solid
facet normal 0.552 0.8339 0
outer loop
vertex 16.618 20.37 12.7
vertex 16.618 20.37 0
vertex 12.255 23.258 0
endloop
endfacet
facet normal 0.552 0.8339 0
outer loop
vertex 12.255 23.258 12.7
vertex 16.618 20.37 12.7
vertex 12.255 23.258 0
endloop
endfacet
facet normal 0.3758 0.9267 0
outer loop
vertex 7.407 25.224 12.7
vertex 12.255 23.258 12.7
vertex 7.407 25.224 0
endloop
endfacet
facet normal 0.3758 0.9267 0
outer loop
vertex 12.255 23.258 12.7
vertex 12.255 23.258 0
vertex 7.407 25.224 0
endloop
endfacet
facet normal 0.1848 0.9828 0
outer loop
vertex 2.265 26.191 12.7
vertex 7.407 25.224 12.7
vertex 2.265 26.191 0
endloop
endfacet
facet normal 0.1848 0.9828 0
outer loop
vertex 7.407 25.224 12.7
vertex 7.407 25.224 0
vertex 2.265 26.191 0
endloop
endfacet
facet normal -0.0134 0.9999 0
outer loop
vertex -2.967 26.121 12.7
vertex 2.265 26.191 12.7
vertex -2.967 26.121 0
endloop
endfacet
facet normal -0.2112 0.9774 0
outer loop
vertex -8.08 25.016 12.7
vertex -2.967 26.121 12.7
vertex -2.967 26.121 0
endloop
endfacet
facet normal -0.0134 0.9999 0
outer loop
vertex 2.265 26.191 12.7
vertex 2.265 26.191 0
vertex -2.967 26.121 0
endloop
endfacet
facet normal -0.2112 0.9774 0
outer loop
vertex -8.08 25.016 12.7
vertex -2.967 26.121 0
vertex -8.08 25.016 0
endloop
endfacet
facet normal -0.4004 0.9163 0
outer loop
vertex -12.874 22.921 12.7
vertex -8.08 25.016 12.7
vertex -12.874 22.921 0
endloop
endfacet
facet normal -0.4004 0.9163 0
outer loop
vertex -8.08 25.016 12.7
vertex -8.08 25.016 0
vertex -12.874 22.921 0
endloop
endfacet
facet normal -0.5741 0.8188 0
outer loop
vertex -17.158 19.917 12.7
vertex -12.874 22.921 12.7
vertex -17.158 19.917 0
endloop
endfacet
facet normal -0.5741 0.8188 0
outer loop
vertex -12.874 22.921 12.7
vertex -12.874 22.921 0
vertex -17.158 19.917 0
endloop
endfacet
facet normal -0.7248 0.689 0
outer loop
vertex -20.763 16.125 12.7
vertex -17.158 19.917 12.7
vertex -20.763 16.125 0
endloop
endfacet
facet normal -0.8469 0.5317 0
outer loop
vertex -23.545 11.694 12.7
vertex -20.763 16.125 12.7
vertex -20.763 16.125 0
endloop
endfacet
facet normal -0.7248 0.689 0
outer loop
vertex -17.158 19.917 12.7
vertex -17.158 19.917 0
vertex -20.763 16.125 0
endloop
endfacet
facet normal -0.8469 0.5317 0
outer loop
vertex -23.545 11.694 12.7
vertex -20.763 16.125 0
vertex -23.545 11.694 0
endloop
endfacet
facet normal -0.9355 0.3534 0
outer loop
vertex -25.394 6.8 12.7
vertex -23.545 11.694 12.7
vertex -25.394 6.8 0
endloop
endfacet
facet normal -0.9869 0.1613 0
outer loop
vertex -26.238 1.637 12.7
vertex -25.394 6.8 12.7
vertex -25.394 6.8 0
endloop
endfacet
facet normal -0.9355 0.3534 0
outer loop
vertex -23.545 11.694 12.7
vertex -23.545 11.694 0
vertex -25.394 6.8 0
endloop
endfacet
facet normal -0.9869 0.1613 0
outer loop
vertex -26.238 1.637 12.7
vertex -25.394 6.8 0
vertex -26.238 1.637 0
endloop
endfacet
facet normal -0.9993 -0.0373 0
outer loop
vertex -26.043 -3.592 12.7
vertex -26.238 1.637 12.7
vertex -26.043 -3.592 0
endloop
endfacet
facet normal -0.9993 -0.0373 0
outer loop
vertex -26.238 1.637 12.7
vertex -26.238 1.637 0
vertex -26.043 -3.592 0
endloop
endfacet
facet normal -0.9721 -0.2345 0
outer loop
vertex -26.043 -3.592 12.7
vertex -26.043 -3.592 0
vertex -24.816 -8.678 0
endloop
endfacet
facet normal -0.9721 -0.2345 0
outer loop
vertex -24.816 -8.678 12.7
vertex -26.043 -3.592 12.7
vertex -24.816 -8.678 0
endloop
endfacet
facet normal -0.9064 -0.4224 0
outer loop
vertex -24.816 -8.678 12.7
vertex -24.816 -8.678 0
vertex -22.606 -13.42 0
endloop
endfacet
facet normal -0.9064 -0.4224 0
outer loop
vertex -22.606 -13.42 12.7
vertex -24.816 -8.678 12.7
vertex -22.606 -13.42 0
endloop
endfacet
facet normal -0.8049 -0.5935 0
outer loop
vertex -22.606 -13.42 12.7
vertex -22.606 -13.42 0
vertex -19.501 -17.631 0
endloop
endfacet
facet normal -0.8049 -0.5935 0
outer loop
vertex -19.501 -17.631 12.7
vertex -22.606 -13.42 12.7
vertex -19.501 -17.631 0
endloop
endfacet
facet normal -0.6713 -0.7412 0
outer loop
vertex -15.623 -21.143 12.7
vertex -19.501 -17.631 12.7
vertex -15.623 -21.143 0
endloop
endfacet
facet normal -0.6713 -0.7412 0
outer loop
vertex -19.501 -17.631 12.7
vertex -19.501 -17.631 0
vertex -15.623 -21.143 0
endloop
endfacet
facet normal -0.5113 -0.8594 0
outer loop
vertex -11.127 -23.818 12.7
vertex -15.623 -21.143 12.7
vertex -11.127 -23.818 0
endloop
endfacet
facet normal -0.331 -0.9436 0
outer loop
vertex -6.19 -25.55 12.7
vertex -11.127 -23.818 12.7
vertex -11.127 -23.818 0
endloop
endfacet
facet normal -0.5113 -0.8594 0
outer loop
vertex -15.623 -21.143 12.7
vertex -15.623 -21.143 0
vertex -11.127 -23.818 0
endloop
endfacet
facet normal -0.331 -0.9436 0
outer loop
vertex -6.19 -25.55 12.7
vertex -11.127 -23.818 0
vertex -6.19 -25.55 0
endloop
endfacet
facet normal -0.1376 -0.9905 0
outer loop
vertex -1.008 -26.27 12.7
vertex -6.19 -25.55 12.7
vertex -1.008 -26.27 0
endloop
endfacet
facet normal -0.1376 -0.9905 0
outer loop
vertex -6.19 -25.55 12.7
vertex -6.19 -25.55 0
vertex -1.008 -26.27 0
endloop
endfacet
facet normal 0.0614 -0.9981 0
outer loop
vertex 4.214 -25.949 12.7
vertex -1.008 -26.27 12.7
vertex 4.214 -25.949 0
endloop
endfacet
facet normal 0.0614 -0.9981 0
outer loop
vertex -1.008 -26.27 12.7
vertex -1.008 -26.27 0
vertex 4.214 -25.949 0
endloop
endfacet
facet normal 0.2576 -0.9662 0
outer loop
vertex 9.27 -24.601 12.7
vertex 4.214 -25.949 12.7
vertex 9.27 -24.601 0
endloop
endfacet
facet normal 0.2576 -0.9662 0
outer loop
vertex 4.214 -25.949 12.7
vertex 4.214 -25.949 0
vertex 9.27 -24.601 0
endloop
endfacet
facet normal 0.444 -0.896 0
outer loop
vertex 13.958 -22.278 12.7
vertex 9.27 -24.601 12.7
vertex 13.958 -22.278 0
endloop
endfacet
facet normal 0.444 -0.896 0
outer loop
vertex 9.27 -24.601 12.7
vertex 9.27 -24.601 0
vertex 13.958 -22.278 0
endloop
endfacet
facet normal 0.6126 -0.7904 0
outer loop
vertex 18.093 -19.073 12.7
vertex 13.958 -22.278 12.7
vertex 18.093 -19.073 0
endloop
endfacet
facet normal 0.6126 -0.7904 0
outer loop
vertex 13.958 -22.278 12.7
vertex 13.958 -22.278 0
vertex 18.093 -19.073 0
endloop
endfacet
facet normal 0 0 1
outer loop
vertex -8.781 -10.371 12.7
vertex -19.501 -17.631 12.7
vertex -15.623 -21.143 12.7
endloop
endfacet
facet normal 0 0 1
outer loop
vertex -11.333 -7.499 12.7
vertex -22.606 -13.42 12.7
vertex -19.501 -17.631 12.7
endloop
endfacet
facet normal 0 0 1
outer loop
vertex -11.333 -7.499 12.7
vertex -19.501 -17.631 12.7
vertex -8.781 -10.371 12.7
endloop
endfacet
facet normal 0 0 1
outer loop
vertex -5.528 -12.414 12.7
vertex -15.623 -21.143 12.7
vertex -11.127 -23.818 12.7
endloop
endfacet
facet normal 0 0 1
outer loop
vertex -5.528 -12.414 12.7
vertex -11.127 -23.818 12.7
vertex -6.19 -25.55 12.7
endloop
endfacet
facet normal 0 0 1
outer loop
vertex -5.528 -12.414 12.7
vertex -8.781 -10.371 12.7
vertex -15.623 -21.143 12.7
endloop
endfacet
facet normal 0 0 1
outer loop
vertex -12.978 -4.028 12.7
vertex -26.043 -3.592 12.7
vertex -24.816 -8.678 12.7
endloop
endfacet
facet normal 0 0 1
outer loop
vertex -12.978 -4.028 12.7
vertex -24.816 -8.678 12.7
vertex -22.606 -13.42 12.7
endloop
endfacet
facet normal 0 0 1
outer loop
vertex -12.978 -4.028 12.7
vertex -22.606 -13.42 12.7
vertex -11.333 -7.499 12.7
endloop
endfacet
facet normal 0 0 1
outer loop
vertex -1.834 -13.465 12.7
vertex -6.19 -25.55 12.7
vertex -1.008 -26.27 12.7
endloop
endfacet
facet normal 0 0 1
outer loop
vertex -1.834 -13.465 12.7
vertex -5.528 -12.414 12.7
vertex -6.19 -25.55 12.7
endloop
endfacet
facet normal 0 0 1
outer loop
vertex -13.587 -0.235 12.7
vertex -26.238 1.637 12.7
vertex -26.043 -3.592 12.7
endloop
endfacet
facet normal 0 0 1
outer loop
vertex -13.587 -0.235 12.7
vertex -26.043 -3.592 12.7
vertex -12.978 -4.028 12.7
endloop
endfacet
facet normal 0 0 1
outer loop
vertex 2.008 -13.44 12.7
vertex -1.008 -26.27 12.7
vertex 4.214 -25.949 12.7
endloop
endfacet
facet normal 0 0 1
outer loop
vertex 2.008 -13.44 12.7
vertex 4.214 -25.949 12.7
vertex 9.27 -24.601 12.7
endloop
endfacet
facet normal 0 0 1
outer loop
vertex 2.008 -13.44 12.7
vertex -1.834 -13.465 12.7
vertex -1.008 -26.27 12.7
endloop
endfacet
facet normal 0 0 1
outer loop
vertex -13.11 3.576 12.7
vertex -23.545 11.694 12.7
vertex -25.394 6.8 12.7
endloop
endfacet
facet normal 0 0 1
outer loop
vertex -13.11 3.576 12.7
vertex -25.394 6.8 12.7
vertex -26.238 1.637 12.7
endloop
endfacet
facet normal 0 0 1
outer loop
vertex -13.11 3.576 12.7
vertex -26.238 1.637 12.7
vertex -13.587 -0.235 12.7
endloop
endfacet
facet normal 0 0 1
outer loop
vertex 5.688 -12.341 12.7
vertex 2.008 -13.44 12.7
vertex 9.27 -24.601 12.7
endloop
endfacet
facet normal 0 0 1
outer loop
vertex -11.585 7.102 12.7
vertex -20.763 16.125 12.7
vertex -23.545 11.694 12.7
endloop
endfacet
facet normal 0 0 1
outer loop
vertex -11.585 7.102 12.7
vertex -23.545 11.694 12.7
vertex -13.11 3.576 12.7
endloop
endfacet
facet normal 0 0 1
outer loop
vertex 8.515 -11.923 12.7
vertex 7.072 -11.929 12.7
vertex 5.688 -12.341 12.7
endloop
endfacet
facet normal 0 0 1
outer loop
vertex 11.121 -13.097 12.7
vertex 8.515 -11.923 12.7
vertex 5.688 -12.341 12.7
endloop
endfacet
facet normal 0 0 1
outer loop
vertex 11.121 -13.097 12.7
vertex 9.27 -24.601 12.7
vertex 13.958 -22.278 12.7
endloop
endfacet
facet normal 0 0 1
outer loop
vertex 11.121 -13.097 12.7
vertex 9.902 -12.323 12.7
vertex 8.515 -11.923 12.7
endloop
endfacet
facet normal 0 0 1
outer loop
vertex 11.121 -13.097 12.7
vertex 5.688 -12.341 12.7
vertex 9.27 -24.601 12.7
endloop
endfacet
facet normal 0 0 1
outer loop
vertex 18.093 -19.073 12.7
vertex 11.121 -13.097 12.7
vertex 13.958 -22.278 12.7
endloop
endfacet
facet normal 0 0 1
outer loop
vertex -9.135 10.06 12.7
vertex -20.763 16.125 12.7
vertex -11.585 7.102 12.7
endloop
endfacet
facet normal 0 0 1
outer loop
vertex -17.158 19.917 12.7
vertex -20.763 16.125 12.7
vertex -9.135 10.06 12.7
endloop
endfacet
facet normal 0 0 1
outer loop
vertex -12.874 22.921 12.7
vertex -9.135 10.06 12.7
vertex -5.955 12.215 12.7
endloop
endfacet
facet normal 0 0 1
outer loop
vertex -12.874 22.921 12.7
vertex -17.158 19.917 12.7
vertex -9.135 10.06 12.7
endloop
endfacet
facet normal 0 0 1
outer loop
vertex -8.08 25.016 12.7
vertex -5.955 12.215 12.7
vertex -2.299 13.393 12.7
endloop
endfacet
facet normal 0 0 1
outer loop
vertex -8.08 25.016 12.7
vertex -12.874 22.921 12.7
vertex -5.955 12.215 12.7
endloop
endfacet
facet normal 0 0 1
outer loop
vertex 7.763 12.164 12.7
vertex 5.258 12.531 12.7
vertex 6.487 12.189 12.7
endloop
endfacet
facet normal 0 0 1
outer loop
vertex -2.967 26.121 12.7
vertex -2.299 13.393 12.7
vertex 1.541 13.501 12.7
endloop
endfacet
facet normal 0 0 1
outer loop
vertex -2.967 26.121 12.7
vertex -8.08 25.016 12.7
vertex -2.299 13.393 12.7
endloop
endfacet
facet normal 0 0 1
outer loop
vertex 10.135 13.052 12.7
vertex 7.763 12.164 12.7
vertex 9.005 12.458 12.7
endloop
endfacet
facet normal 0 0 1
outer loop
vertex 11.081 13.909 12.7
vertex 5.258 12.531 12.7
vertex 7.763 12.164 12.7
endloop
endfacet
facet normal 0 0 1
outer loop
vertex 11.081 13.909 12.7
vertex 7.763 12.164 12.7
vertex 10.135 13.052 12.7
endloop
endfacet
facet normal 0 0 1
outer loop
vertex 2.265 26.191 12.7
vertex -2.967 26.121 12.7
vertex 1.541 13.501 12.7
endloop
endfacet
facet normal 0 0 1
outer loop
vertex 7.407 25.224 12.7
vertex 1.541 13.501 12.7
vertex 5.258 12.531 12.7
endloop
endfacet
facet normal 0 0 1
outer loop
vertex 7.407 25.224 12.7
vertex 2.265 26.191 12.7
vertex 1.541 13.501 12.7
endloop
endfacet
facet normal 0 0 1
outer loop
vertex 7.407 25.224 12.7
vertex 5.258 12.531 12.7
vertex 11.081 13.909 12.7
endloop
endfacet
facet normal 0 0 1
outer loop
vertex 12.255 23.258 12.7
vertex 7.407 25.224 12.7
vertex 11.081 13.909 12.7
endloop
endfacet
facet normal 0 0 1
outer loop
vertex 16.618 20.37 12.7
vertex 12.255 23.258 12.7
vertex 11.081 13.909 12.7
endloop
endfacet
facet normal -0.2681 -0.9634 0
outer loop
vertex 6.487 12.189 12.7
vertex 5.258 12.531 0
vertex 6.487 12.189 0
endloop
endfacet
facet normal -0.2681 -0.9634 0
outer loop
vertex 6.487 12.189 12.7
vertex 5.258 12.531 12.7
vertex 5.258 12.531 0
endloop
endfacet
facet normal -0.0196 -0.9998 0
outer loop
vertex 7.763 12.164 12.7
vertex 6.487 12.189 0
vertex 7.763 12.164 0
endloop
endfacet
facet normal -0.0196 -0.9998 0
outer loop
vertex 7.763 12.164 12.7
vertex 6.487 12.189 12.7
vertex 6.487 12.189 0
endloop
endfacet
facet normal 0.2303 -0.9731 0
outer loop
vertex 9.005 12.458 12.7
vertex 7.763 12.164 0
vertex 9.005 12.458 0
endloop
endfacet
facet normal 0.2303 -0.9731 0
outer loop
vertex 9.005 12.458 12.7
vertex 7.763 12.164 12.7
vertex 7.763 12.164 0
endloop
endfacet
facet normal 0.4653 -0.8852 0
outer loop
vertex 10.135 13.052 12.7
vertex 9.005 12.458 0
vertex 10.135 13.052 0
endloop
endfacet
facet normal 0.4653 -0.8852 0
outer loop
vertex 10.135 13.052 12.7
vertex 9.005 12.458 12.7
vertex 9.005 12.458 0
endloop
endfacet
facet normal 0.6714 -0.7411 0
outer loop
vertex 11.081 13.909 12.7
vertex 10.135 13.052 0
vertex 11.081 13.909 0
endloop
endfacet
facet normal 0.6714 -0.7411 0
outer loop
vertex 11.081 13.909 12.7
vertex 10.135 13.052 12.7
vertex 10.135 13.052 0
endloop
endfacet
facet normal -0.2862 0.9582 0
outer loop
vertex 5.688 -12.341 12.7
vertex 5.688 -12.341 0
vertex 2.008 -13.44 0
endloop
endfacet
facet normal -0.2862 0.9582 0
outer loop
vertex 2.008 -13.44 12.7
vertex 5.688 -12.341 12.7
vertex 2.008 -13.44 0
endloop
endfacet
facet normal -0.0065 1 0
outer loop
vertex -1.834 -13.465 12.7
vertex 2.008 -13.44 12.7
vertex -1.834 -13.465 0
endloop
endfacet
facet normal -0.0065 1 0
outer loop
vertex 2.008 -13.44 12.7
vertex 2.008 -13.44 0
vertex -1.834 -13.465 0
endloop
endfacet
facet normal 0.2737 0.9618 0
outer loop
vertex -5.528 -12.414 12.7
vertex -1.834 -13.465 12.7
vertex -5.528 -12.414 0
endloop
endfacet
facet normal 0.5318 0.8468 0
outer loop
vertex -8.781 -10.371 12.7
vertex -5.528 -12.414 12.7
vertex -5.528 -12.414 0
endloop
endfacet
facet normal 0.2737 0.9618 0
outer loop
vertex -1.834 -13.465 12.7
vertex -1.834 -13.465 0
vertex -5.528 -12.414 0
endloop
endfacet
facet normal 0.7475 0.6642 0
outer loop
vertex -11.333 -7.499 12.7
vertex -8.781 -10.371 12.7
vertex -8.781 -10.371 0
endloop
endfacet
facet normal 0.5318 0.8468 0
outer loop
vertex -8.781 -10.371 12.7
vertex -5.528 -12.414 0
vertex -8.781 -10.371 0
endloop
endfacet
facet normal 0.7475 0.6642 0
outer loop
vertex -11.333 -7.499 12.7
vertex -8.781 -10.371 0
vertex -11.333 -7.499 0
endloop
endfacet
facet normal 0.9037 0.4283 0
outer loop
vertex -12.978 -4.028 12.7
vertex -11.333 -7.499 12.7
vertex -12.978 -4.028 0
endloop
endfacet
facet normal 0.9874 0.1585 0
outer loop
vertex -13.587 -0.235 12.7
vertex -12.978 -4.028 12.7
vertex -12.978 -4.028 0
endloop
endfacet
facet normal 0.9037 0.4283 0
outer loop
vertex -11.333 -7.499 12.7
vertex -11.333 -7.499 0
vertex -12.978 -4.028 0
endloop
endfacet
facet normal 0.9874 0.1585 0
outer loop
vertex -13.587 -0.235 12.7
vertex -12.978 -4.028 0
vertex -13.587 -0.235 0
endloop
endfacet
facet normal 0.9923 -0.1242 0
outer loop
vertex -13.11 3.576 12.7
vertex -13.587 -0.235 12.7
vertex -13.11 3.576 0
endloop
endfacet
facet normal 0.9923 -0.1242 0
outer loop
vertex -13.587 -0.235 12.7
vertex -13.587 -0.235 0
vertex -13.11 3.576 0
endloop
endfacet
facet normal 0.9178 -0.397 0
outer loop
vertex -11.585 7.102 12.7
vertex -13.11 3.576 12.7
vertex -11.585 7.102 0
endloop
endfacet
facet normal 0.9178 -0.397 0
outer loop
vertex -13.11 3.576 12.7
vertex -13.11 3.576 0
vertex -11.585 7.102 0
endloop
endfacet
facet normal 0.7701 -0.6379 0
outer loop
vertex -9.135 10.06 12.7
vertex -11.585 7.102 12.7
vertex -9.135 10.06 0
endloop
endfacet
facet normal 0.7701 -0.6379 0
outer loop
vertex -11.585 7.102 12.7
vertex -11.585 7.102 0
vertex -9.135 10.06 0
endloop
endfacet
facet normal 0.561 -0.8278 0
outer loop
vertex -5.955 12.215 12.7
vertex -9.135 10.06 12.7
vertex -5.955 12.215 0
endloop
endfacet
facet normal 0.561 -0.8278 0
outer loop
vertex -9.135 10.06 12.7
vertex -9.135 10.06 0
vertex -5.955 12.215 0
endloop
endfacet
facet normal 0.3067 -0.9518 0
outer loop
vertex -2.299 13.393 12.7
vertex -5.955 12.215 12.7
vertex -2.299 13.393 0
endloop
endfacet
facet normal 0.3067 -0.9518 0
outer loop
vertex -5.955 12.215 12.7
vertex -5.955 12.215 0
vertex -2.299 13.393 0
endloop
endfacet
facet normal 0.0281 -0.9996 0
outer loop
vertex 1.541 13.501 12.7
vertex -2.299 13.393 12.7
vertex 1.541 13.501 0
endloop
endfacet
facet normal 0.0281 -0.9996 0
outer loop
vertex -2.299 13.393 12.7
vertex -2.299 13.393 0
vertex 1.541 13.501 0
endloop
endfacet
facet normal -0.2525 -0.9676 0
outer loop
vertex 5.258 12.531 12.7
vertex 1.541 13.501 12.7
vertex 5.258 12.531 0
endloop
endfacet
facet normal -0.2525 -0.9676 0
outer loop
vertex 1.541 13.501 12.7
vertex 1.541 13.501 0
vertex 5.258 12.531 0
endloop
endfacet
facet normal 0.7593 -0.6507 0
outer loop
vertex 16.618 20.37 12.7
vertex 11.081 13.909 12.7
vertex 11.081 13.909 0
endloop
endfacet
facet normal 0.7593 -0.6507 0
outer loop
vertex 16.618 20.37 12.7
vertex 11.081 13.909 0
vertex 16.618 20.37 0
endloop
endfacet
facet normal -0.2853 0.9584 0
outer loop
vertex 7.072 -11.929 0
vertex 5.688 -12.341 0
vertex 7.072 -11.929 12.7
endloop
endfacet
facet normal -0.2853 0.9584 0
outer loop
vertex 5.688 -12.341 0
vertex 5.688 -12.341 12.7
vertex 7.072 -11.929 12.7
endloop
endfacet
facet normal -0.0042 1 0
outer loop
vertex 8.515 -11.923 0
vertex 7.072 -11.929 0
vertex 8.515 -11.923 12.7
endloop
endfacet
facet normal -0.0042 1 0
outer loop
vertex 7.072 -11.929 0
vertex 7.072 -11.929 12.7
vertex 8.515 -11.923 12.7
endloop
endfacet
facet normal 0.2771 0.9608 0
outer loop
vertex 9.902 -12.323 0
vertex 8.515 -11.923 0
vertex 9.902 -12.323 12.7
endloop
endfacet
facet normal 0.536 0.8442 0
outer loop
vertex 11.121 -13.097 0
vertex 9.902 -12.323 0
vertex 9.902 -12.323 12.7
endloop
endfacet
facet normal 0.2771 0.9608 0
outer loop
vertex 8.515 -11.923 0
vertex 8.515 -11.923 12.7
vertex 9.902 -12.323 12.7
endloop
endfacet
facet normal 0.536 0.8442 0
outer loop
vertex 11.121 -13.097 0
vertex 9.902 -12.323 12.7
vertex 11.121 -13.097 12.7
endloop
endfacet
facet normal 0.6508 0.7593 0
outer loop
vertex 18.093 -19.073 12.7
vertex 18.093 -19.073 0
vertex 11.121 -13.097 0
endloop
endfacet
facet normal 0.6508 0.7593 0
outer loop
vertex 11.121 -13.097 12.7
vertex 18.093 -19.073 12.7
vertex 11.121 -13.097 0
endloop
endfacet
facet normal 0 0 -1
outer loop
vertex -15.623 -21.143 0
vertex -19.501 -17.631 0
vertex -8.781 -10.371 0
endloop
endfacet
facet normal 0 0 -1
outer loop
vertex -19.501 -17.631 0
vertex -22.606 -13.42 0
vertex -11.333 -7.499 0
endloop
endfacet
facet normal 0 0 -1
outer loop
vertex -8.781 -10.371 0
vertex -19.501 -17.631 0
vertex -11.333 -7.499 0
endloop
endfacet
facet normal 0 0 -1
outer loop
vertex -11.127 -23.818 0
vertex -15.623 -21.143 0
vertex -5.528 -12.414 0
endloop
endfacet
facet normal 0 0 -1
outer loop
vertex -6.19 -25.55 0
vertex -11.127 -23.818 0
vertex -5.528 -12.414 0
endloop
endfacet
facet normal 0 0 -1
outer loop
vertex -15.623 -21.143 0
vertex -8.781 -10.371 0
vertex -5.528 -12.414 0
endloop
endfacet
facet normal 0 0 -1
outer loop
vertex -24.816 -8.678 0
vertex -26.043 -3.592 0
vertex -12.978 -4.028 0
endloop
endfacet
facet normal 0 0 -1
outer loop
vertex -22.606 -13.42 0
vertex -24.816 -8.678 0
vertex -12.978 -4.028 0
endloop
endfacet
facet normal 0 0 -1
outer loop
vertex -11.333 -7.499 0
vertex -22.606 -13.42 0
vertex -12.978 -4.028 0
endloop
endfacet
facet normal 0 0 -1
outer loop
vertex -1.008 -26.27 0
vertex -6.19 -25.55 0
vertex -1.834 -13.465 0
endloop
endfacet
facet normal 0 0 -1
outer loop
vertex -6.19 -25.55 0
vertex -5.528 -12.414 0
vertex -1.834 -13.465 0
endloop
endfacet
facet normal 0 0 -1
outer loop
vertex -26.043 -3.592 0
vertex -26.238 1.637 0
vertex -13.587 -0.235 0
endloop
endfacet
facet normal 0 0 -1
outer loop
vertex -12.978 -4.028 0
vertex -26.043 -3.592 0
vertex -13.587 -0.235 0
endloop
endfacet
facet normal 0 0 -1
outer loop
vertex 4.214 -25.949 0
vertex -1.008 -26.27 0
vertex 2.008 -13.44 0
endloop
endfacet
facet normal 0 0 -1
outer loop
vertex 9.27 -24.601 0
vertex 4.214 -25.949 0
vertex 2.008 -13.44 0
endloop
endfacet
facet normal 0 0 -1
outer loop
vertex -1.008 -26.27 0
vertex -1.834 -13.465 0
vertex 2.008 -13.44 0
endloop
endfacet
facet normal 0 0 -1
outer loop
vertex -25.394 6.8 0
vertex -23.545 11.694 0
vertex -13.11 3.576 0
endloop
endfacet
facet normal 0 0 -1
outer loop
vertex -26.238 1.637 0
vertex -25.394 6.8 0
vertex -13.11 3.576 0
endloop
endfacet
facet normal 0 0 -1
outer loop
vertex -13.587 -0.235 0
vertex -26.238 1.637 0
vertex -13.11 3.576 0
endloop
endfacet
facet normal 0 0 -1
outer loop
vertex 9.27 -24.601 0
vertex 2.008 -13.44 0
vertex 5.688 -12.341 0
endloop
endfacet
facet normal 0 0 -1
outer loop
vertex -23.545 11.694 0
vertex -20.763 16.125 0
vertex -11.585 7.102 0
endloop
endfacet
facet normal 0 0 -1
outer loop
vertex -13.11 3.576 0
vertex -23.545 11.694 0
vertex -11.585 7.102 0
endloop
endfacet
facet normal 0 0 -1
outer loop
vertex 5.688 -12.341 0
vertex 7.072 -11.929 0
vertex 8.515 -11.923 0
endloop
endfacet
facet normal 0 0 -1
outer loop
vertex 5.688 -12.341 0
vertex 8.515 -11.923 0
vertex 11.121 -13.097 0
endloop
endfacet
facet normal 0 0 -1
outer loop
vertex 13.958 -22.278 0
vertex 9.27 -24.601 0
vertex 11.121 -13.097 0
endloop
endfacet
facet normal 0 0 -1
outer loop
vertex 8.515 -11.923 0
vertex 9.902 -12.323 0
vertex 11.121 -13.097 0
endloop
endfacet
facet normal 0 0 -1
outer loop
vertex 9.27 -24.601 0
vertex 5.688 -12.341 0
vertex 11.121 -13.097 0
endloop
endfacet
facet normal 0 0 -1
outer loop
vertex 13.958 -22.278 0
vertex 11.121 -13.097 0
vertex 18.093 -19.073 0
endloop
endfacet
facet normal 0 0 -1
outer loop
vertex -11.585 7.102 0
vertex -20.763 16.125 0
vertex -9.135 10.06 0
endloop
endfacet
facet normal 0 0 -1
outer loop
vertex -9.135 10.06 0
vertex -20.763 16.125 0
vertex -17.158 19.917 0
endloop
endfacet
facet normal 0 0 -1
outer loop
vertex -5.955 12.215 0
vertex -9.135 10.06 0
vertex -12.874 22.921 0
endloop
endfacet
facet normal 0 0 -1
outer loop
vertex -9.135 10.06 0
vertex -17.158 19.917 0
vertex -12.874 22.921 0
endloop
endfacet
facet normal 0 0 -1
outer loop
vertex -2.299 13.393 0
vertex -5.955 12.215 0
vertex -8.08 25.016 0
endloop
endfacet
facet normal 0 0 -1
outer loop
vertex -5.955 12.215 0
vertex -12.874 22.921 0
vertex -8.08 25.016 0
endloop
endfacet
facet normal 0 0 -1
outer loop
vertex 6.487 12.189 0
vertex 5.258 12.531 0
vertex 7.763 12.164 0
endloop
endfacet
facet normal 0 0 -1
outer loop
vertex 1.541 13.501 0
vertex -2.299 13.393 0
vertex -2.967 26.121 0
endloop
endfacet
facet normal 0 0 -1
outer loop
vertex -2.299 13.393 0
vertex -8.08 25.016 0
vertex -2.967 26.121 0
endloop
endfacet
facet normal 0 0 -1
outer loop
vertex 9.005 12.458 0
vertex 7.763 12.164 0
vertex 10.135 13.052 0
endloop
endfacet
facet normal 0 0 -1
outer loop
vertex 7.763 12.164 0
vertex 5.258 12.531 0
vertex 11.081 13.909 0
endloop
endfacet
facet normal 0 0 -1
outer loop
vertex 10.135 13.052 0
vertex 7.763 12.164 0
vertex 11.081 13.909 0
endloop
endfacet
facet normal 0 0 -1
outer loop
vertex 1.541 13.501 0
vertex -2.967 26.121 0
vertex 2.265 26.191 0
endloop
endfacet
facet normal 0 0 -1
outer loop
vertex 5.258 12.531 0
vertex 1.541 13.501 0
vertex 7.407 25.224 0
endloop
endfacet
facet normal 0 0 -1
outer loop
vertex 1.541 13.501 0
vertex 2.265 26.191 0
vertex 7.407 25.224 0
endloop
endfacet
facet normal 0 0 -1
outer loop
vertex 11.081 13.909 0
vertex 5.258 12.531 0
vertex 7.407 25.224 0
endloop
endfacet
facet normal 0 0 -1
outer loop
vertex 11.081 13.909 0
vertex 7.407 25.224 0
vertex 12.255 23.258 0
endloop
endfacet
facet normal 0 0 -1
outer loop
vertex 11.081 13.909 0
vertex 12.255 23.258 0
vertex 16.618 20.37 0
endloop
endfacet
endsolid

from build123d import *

# Parameters (mm, degrees)
F1_DEPTH = 12.7
F2_R     = 5.08


with BuildPart() as f1:
    # F0 (on Top) → F1 (new body)
    with BuildSketch(Plane.XY):
        with BuildLine():
            ThreePointArc((8.348858, -10.721823), (-13.589, 0), (8.348858, 10.721823))
            Line((8.348858, 10.721823), (16.617949, 20.370451))
            ThreePointArc((16.617949, 20.370451), (-26.270642, -0.982292), (18.092772, -19.072575))
            Line((18.092772, -19.072575), (8.348858, -10.721823))
        make_face()
    extrude(amount=F1_DEPTH)

    # F2
    f2_edges = [f1.edges().sort_by_distance(p)[0] for p in [
        (8.348858, 10.721823, 6.35),
        (8.348858, -10.721823, 6.35),
    ]]
    fillet(f2_edges, radius=F2_R)


solid = f1.part
